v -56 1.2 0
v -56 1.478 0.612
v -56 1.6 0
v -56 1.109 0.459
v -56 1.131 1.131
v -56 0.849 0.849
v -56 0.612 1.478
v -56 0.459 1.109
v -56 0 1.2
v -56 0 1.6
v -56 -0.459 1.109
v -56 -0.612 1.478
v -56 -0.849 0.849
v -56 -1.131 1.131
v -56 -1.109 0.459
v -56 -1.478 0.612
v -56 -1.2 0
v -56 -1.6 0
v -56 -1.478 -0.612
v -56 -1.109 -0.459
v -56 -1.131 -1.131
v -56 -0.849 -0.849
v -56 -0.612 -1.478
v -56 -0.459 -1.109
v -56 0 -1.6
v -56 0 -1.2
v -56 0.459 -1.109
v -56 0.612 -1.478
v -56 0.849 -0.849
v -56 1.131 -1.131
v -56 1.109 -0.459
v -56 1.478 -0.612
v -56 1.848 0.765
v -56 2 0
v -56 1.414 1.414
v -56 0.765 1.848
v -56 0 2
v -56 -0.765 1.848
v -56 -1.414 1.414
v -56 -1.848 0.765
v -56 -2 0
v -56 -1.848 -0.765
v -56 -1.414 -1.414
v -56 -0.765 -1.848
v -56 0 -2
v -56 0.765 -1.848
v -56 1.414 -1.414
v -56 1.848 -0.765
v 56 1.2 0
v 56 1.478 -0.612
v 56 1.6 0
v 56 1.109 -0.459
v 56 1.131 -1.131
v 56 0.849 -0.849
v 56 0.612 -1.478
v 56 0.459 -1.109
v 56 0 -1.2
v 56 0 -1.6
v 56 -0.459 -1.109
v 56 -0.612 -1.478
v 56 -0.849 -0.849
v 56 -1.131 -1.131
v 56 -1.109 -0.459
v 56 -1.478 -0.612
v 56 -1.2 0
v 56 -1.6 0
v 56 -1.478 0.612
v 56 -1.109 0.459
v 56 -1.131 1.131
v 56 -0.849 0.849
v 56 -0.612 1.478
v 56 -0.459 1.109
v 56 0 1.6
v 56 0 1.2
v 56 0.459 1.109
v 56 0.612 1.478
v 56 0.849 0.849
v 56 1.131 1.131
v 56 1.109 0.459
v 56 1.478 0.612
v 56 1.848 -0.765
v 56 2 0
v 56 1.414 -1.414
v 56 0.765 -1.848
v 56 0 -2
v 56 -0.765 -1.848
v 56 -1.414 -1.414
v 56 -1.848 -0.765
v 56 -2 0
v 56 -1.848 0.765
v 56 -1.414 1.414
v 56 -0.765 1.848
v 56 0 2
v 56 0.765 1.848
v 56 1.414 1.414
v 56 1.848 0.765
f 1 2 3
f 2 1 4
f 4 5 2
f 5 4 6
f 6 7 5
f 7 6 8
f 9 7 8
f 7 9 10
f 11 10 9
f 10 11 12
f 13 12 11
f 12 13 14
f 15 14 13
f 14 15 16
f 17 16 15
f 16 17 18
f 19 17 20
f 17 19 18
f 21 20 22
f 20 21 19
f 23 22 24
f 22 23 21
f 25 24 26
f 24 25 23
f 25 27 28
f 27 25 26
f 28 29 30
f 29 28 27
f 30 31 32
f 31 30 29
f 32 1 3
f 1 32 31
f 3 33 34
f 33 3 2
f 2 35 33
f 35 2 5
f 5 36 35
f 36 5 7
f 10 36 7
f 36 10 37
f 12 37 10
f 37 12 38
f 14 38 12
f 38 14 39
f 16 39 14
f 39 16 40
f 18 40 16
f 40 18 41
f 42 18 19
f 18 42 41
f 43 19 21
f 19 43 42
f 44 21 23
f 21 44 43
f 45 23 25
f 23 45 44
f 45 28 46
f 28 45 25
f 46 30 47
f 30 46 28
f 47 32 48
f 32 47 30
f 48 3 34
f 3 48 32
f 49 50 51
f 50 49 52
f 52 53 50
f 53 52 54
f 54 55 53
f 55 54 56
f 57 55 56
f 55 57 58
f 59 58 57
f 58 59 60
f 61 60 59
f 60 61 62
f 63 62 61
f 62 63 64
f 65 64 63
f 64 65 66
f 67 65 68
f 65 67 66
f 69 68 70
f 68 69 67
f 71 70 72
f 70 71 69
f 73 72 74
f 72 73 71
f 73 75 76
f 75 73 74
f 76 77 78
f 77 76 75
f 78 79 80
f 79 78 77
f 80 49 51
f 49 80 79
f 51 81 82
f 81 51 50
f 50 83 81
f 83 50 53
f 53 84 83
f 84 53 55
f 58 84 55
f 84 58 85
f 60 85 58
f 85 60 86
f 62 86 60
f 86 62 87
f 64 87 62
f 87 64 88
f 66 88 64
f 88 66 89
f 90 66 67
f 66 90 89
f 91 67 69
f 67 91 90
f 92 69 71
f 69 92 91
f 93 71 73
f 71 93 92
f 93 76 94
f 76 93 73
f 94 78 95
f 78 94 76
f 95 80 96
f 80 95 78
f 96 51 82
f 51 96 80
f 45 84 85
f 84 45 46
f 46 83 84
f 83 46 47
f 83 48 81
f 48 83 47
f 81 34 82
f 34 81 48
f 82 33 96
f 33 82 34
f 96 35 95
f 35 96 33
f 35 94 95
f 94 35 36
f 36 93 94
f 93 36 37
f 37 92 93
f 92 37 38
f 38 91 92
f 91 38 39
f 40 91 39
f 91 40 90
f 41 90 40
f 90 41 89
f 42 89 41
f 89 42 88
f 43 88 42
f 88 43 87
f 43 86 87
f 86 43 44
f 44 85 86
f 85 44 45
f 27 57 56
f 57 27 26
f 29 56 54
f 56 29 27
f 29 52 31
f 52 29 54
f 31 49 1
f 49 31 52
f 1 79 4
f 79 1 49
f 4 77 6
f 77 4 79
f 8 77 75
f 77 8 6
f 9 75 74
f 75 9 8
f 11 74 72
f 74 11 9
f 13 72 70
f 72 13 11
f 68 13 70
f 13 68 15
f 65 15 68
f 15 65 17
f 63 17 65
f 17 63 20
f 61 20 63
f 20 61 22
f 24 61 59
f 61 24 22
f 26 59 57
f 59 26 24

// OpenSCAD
// file: ../p/4-4cyli.scad
use <../lib.scad>
function ldraw_lib__4_4cyli() = [
// 0 Cylinder 1.0
// 0 Name: 4-4cyli.dat
// 0 Author: James Jessiman
// 0 !LDRAW_ORG Primitive UPDATE 2005-01
// 0 !LICENSE Licensed under CC BY 2.0 and CC BY 4.0 : see CAreadme.txt
// 
// 0 BFC CERTIFY CCW
  [0,"BFC","CERTIFY"],
  [0,"BFC","CCW"],
// 
// 0 !HISTORY 1998-12-15 [PTadmin] Official Update 1998-10
// 0 !HISTORY 2002-03-23 [sbliss] Added BFC statement; merged headers from files in distributions LDraw 0.27 and Complete.
// 0 !HISTORY 2002-04-25 [PTadmin] Official Update 2002-02
// 0 !HISTORY 2004-12-14 [guyvivan] BFC CCW
// 0 !HISTORY 2005-12-28 [PTadmin] Official Update 2005-01
// 0 !HISTORY 2007-06-24 [PTadmin] Header formatted for Contributor Agreement
// 0 !HISTORY 2008-07-01 [PTadmin] Official Update 2008-01
// 
// 
// 4 16 1 1 0 0.9239 1 0.3827 0.9239 0 0.3827 1 0 0
  [4,16,1,1,0,0.9239,1,0.3827,0.9239,0,0.3827,1,0,0],
// 5 24 1 0 0 1 1 0 0.9239 0 0.3827 0.9239 0 -0.3827
  [5,24,1,0,0,1,1,0,0.9239,0,0.3827,0.9239,0,-0.3827],
// 4 16 0.9239 1 0.3827 0.7071 1 0.7071 0.7071 0 0.7071 0.9239 0 0.3827
  [4,16,0.9239,1,0.3827,0.7071,1,0.7071,0.7071,0,0.7071,0.9239,0,0.3827],
// 5 24 0.9239 0 0.3827 0.9239 1 0.3827 0.7071 0 0.7071 1 0 0
  [5,24,0.9239,0,0.3827,0.9239,1,0.3827,0.7071,0,0.7071,1,0,0],
// 4 16 0.7071 1 0.7071 0.3827 1 0.9239 0.3827 0 0.9239 0.7071 0 0.7071
  [4,16,0.7071,1,0.7071,0.3827,1,0.9239,0.3827,0,0.9239,0.7071,0,0.7071],
// 5 24 0.7071 0 0.7071 0.7071 1 0.7071 0.3827 0 0.9239 0.9239 0 0.3827
  [5,24,0.7071,0,0.7071,0.7071,1,0.7071,0.3827,0,0.9239,0.9239,0,0.3827],
// 4 16 0.3827 1 0.9239 0 1 1 0 0 1 0.3827 0 0.9239
  [4,16,0.3827,1,0.9239,0,1,1,0,0,1,0.3827,0,0.9239],
// 5 24 0.3827 0 0.9239 0.3827 1 0.9239 0 0 1 0.7071 0 0.7071
  [5,24,0.3827,0,0.9239,0.3827,1,0.9239,0,0,1,0.7071,0,0.7071],
// 4 16 0 1 1 -0.3827 1 0.9239 -0.3827 0 0.9239 0 0 1
  [4,16,0,1,1,-0.3827,1,0.9239,-0.3827,0,0.9239,0,0,1],
// 5 24 0 0 1 0 1 1 -0.3827 0 0.9239 0.3827 0 0.9239
  [5,24,0,0,1,0,1,1,-0.3827,0,0.9239,0.3827,0,0.9239],
// 4 16 -0.3827 1 0.9239 -0.7071 1 0.7071 -0.7071 0 0.7071 -0.3827 0 0.9239
  [4,16,-0.3827,1,0.9239,-0.7071,1,0.7071,-0.7071,0,0.7071,-0.3827,0,0.9239],
// 5 24 -0.3827 0 0.9239 -0.3827 1 0.9239 -0.7071 0 0.7071 0 0 1
  [5,24,-0.3827,0,0.9239,-0.3827,1,0.9239,-0.7071,0,0.7071,0,0,1],
// 4 16 -0.7071 1 0.7071 -0.9239 1 0.3827 -0.9239 0 0.3827 -0.7071 0 0.7071
  [4,16,-0.7071,1,0.7071,-0.9239,1,0.3827,-0.9239,0,0.3827,-0.7071,0,0.7071],
// 5 24 -0.7071 0 0.7071 -0.7071 1 0.7071 -0.9239 0 0.3827 -0.3827 0 0.9239
  [5,24,-0.7071,0,0.7071,-0.7071,1,0.7071,-0.9239,0,0.3827,-0.3827,0,0.9239],
// 4 16 -0.9239 1 0.3827 -1 1 0 -1 0 0 -0.9239 0 0.3827
  [4,16,-0.9239,1,0.3827,-1,1,0,-1,0,0,-0.9239,0,0.3827],
// 5 24 -0.9239 0 0.3827 -0.9239 1 0.3827 -1 0 0 -0.7071 0 0.7071
  [5,24,-0.9239,0,0.3827,-0.9239,1,0.3827,-1,0,0,-0.7071,0,0.7071],
// 4 16 -1 1 0 -0.9239 1 -0.3827 -0.9239 0 -0.3827 -1 0 0
  [4,16,-1,1,0,-0.9239,1,-0.3827,-0.9239,0,-0.3827,-1,0,0],
// 5 24 -1 0 0 -1 1 0 -0.9239 0 -0.3827 -0.9239 0 0.3827
  [5,24,-1,0,0,-1,1,0,-0.9239,0,-0.3827,-0.9239,0,0.3827],
// 4 16 -0.9239 1 -0.3827 -0.7071 1 -0.7071 -0.7071 0 -0.7071 -0.9239 0 -0.3827
  [4,16,-0.9239,1,-0.3827,-0.7071,1,-0.7071,-0.7071,0,-0.7071,-0.9239,0,-0.3827],
// 5 24 -0.9239 0 -0.3827 -0.9239 1 -0.3827 -0.7071 0 -0.7071 -1 0 0
  [5,24,-0.9239,0,-0.3827,-0.9239,1,-0.3827,-0.7071,0,-0.7071,-1,0,0],
// 4 16 -0.7071 1 -0.7071 -0.3827 1 -0.9239 -0.3827 0 -0.9239 -0.7071 0 -0.7071
  [4,16,-0.7071,1,-0.7071,-0.3827,1,-0.9239,-0.3827,0,-0.9239,-0.7071,0,-0.7071],
// 5 24 -0.7071 0 -0.7071 -0.7071 1 -0.7071 -0.3827 0 -0.9239 -0.9239 0 -0.3827
  [5,24,-0.7071,0,-0.7071,-0.7071,1,-0.7071,-0.3827,0,-0.9239,-0.9239,0,-0.3827],
// 4 16 -0.3827 1 -0.9239 0 1 -1 0 0 -1 -0.3827 0 -0.9239
  [4,16,-0.3827,1,-0.9239,0,1,-1,0,0,-1,-0.3827,0,-0.9239],
// 5 24 -0.3827 0 -0.9239 -0.3827 1 -0.9239 0 0 -1 -0.7071 0 -0.7071
  [5,24,-0.3827,0,-0.9239,-0.3827,1,-0.9239,0,0,-1,-0.7071,0,-0.7071],
// 4 16 0 1 -1 0.3827 1 -0.9239 0.3827 0 -0.9239 0 0 -1
  [4,16,0,1,-1,0.3827,1,-0.9239,0.3827,0,-0.9239,0,0,-1],
// 5 24 0 0 -1 0 1 -1 0.3827 0 -0.9239 -0.3827 0 -0.9239
  [5,24,0,0,-1,0,1,-1,0.3827,0,-0.9239,-0.3827,0,-0.9239],
// 4 16 0.3827 1 -0.9239 0.7071 1 -0.7071 0.7071 0 -0.7071 0.3827 0 -0.9239
  [4,16,0.3827,1,-0.9239,0.7071,1,-0.7071,0.7071,0,-0.7071,0.3827,0,-0.9239],
// 5 24 0.3827 0 -0.9239 0.3827 1 -0.9239 0.7071 0 -0.7071 0 0 -1
  [5,24,0.3827,0,-0.9239,0.3827,1,-0.9239,0.7071,0,-0.7071,0,0,-1],
// 4 16 0.7071 1 -0.7071 0.9239 1 -0.3827 0.9239 0 -0.3827 0.7071 0 -0.7071
  [4,16,0.7071,1,-0.7071,0.9239,1,-0.3827,0.9239,0,-0.3827,0.7071,0,-0.7071],
// 5 24 0.7071 0 -0.7071 0.7071 1 -0.7071 0.9239 0 -0.3827 0.3827 0 -0.9239
  [5,24,0.7071,0,-0.7071,0.7071,1,-0.7071,0.9239,0,-0.3827,0.3827,0,-0.9239],
// 4 16 0.9239 1 -0.3827 1 1 0 1 0 0 0.9239 0 -0.3827
  [4,16,0.9239,1,-0.3827,1,1,0,1,0,0,0.9239,0,-0.3827],
// 5 24 0.9239 0 -0.3827 0.9239 1 -0.3827 1 0 0 0.7071 0 -0.7071
  [5,24,0.9239,0,-0.3827,0.9239,1,-0.3827,1,0,0,0.7071,0,-0.7071],
// 0
];
module ldraw_lib__4_4cyli(step=0, col=false, unit=2/5, alt=false, line=0.2, solid=!$preview)
    makepoly(ldraw_lib__4_4cyli(), step=step, col=col, unit=unit, alt=alt, line=line, solid=solid);
ldraw_lib__4_4cyli(line=0.2);
// file: ../p/4-4ring4.scad
use <../lib.scad>
function ldraw_lib__4_4ring4() = [
// 0 Ring  4 x 1.0
// 0 Name: 4-4ring4.dat
// 0 Author: James Jessiman
// 0 !LDRAW_ORG Primitive UPDATE 2009-01
// 0 !LICENSE Licensed under CC BY 2.0 and CC BY 4.0 : see CAreadme.txt
// 
// 0 BFC CERTIFY CCW
  [0,"BFC","CERTIFY"],
  [0,"BFC","CCW"],
// 
// 0 !HISTORY 1998-12-15 [PTadmin] Official Update 1998-10
// 0 !HISTORY 2002-04-08 [BrickCaster] Modified for BFC compliance
// 0 !HISTORY 2002-04-25 [PTadmin] Official Update 2002-02
// 0 !HISTORY 2007-06-24 [PTadmin] Header formatted for Contributor Agreement
// 0 !HISTORY 2008-07-01 [PTadmin] Official Update 2008-01
// 0 !HISTORY 2008-08-26 [cwdee] Switch polygon winding and rename
// 0 !HISTORY 2009-05-02 [PTadmin] Official Update 2009-01
// 
// 
// 4 16 -1.9135 0 4.6195 -1.5308 0 3.6956 0 0 4 0 0 5
  [4,16,-1.9135,0,4.6195,-1.5308,0,3.6956,0,0,4,0,0,5],
// 4 16 -3.5355 0 3.5355 -2.8284 0 2.8284 -1.5308 0 3.6956 -1.9135 0 4.6195
  [4,16,-3.5355,0,3.5355,-2.8284,0,2.8284,-1.5308,0,3.6956,-1.9135,0,4.6195],
// 4 16 -4.6195 0 1.9135 -3.6956 0 1.5308 -2.8284 0 2.8284 -3.5355 0 3.5355
  [4,16,-4.6195,0,1.9135,-3.6956,0,1.5308,-2.8284,0,2.8284,-3.5355,0,3.5355],
// 4 16 -5 0 0 -4 0 0 -3.6956 0 1.5308 -4.6195 0 1.9135
  [4,16,-5,0,0,-4,0,0,-3.6956,0,1.5308,-4.6195,0,1.9135],
// 4 16 -4.6195 0 -1.9135 -3.6956 0 -1.5308 -4 0 0 -5 0 0
  [4,16,-4.6195,0,-1.9135,-3.6956,0,-1.5308,-4,0,0,-5,0,0],
// 4 16 -3.5355 0 -3.5355 -2.8284 0 -2.8284 -3.6956 0 -1.5308 -4.6195 0 -1.9135
  [4,16,-3.5355,0,-3.5355,-2.8284,0,-2.8284,-3.6956,0,-1.5308,-4.6195,0,-1.9135],
// 4 16 -1.9135 0 -4.6195 -1.5308 0 -3.6956 -2.8284 0 -2.8284 -3.5355 0 -3.5355
  [4,16,-1.9135,0,-4.6195,-1.5308,0,-3.6956,-2.8284,0,-2.8284,-3.5355,0,-3.5355],
// 4 16 0 0 -5 0 0 -4 -1.5308 0 -3.6956 -1.9135 0 -4.6195
  [4,16,0,0,-5,0,0,-4,-1.5308,0,-3.6956,-1.9135,0,-4.6195],
// 4 16 1.9135 0 -4.6195 1.5308 0 -3.6956 0 0 -4 0 0 -5
  [4,16,1.9135,0,-4.6195,1.5308,0,-3.6956,0,0,-4,0,0,-5],
// 4 16 3.5355 0 -3.5355 2.8284 0 -2.8284 1.5308 0 -3.6956 1.9135 0 -4.6195
  [4,16,3.5355,0,-3.5355,2.8284,0,-2.8284,1.5308,0,-3.6956,1.9135,0,-4.6195],
// 4 16 4.6195 0 -1.9135 3.6956 0 -1.5308 2.8284 0 -2.8284 3.5355 0 -3.5355
  [4,16,4.6195,0,-1.9135,3.6956,0,-1.5308,2.8284,0,-2.8284,3.5355,0,-3.5355],
// 4 16 5 0 0 4 0 0 3.6956 0 -1.5308 4.6195 0 -1.9135
  [4,16,5,0,0,4,0,0,3.6956,0,-1.5308,4.6195,0,-1.9135],
// 4 16 4.6195 0 1.9135 3.6956 0 1.5308 4 0 0 5 0 0
  [4,16,4.6195,0,1.9135,3.6956,0,1.5308,4,0,0,5,0,0],
// 4 16 3.5355 0 3.5355 2.8284 0 2.8284 3.6956 0 1.5308 4.6195 0 1.9135
  [4,16,3.5355,0,3.5355,2.8284,0,2.8284,3.6956,0,1.5308,4.6195,0,1.9135],
// 4 16 1.9135 0 4.6195 1.5308 0 3.6956 2.8284 0 2.8284 3.5355 0 3.5355
  [4,16,1.9135,0,4.6195,1.5308,0,3.6956,2.8284,0,2.8284,3.5355,0,3.5355],
// 4 16 0 0 5 0 0 4 1.5308 0 3.6956 1.9135 0 4.6195
  [4,16,0,0,5,0,0,4,1.5308,0,3.6956,1.9135,0,4.6195],
// 0
];
module ldraw_lib__4_4ring4(step=0, col=false, unit=2/5, alt=false, line=0.2, solid=!$preview)
    makepoly(ldraw_lib__4_4ring4(), step=step, col=col, unit=unit, alt=alt, line=line, solid=solid);
ldraw_lib__4_4ring4(line=0.2);
// file: ../p/4-4ring3.scad
use <../lib.scad>
function ldraw_lib__4_4ring3() = [
// 0 Ring  3 x 1.0
// 0 Name: 4-4ring3.dat
// 0 Author: James Jessiman
// 0 !LDRAW_ORG Primitive UPDATE 2009-01
// 0 !LICENSE Licensed under CC BY 2.0 and CC BY 4.0 : see CAreadme.txt
// 
// 0 BFC CERTIFY CCW
  [0,"BFC","CERTIFY"],
  [0,"BFC","CCW"],
// 
// 0 !HISTORY 1998-12-15 [PTadmin] Official Update 1998-10
// 0 !HISTORY 2002-04-05 [hafhead] Added BFC statement
// 0 !HISTORY 2002-04-25 [PTadmin] Official Update 2002-02
// 0 !HISTORY 2007-06-24 [PTadmin] Header formatted for Contributor Agreement
// 0 !HISTORY 2008-07-01 [PTadmin] Official Update 2008-01
// 0 !HISTORY 2008-08-26 [cwdee] Switch polygon winding and rename
// 0 !HISTORY 2009-05-02 [PTadmin] Official Update 2009-01
// 
// 
// 4 16 -1.5308 0 3.6956 -1.1481 0 2.7717 0 0 3 0 0 4
  [4,16,-1.5308,0,3.6956,-1.1481,0,2.7717,0,0,3,0,0,4],
// 4 16 -2.8284 0 2.8284 -2.1213 0 2.1213 -1.1481 0 2.7717 -1.5308 0 3.6956
  [4,16,-2.8284,0,2.8284,-2.1213,0,2.1213,-1.1481,0,2.7717,-1.5308,0,3.6956],
// 4 16 -3.6956 0 1.5308 -2.7717 0 1.1481 -2.1213 0 2.1213 -2.8284 0 2.8284
  [4,16,-3.6956,0,1.5308,-2.7717,0,1.1481,-2.1213,0,2.1213,-2.8284,0,2.8284],
// 4 16 -4 0 0 -3 0 0 -2.7717 0 1.1481 -3.6956 0 1.5308
  [4,16,-4,0,0,-3,0,0,-2.7717,0,1.1481,-3.6956,0,1.5308],
// 4 16 -3.6956 0 -1.5308 -2.7717 0 -1.1481 -3 0 0 -4 0 0
  [4,16,-3.6956,0,-1.5308,-2.7717,0,-1.1481,-3,0,0,-4,0,0],
// 4 16 -2.8284 0 -2.8284 -2.1213 0 -2.1213 -2.7717 0 -1.1481 -3.6956 0 -1.5308
  [4,16,-2.8284,0,-2.8284,-2.1213,0,-2.1213,-2.7717,0,-1.1481,-3.6956,0,-1.5308],
// 4 16 -1.5308 0 -3.6956 -1.1481 0 -2.7717 -2.1213 0 -2.1213 -2.8284 0 -2.8284
  [4,16,-1.5308,0,-3.6956,-1.1481,0,-2.7717,-2.1213,0,-2.1213,-2.8284,0,-2.8284],
// 4 16 0 0 -4 0 0 -3 -1.1481 0 -2.7717 -1.5308 0 -3.6956
  [4,16,0,0,-4,0,0,-3,-1.1481,0,-2.7717,-1.5308,0,-3.6956],
// 4 16 1.5308 0 -3.6956 1.1481 0 -2.7717 0 0 -3 0 0 -4
  [4,16,1.5308,0,-3.6956,1.1481,0,-2.7717,0,0,-3,0,0,-4],
// 4 16 2.8284 0 -2.8284 2.1213 0 -2.1213 1.1481 0 -2.7717 1.5308 0 -3.6956
  [4,16,2.8284,0,-2.8284,2.1213,0,-2.1213,1.1481,0,-2.7717,1.5308,0,-3.6956],
// 4 16 3.6956 0 -1.5308 2.7717 0 -1.1481 2.1213 0 -2.1213 2.8284 0 -2.8284
  [4,16,3.6956,0,-1.5308,2.7717,0,-1.1481,2.1213,0,-2.1213,2.8284,0,-2.8284],
// 4 16 4 0 0 3 0 0 2.7717 0 -1.1481 3.6956 0 -1.5308
  [4,16,4,0,0,3,0,0,2.7717,0,-1.1481,3.6956,0,-1.5308],
// 4 16 3.6956 0 1.5308 2.7717 0 1.1481 3 0 0 4 0 0
  [4,16,3.6956,0,1.5308,2.7717,0,1.1481,3,0,0,4,0,0],
// 4 16 2.8284 0 2.8284 2.1213 0 2.1213 2.7717 0 1.1481 3.6956 0 1.5308
  [4,16,2.8284,0,2.8284,2.1213,0,2.1213,2.7717,0,1.1481,3.6956,0,1.5308],
// 4 16 1.5308 0 3.6956 1.1481 0 2.7717 2.1213 0 2.1213 2.8284 0 2.8284
  [4,16,1.5308,0,3.6956,1.1481,0,2.7717,2.1213,0,2.1213,2.8284,0,2.8284],
// 4 16 0 0 4 0 0 3 1.1481 0 2.7717 1.5308 0 3.6956
  [4,16,0,0,4,0,0,3,1.1481,0,2.7717,1.5308,0,3.6956],
// 0
];
module ldraw_lib__4_4ring3(step=0, col=false, unit=2/5, alt=false, line=0.2, solid=!$preview)
    makepoly(ldraw_lib__4_4ring3(), step=step, col=col, unit=unit, alt=alt, line=line, solid=solid);
ldraw_lib__4_4ring3(line=0.2);
// file: ../p/4-4edge.scad
use <../lib.scad>
function ldraw_lib__4_4edge() = [
// 0 Circle 1.0
// 0 Name: 4-4edge.dat
// 0 Author: James Jessiman
// 0 !LDRAW_ORG Primitive UPDATE 2017-01
// 0 !LICENSE Licensed under CC BY 4.0 : see CAreadme.txt
// 
// 0 BFC CERTIFY CCW
  [0,"BFC","CERTIFY"],
  [0,"BFC","CCW"],
// 
// 0 !HISTORY 1998-12-15 [PTadmin] Official Update 1998-10
// 0 !HISTORY 2005-12-28 [PTadmin] Official Update 2005-01
// 0 !HISTORY 2007-06-24 [PTadmin] Header formatted for Contributor Agreement
// 0 !HISTORY 2008-07-01 [PTadmin] Official Update 2008-01
// 0 !HISTORY 2017-01-15 [Steffen] BFCed
// 0 !HISTORY 2017-12-30 [PTadmin] Official Update 2017-01
// 
// 
// 2 24 1 0 0 0.9239 0 0.3827
  [2,24,1,0,0,0.9239,0,0.3827],
// 2 24 0.9239 0 0.3827 0.7071 0 0.7071
  [2,24,0.9239,0,0.3827,0.7071,0,0.7071],
// 2 24 0.7071 0 0.7071 0.3827 0 0.9239
  [2,24,0.7071,0,0.7071,0.3827,0,0.9239],
// 2 24 0.3827 0 0.9239 0 0 1
  [2,24,0.3827,0,0.9239,0,0,1],
// 2 24 0 0 1 -0.3827 0 0.9239
  [2,24,0,0,1,-0.3827,0,0.9239],
// 2 24 -0.3827 0 0.9239 -0.7071 0 0.7071
  [2,24,-0.3827,0,0.9239,-0.7071,0,0.7071],
// 2 24 -0.7071 0 0.7071 -0.9239 0 0.3827
  [2,24,-0.7071,0,0.7071,-0.9239,0,0.3827],
// 2 24 -0.9239 0 0.3827 -1 0 -0
  [2,24,-0.9239,0,0.3827,-1,0,-0],
// 2 24 -1 0 -0 -0.9239 0 -0.3827
  [2,24,-1,0,-0,-0.9239,0,-0.3827],
// 2 24 -0.9239 0 -0.3827 -0.7071 0 -0.7071
  [2,24,-0.9239,0,-0.3827,-0.7071,0,-0.7071],
// 2 24 -0.7071 0 -0.7071 -0.3827 0 -0.9239
  [2,24,-0.7071,0,-0.7071,-0.3827,0,-0.9239],
// 2 24 -0.3827 0 -0.9239 0 0 -1
  [2,24,-0.3827,0,-0.9239,0,0,-1],
// 2 24 0 0 -1 0.3827 0 -0.9239
  [2,24,0,0,-1,0.3827,0,-0.9239],
// 2 24 0.3827 0 -0.9239 0.7071 0 -0.7071
  [2,24,0.3827,0,-0.9239,0.7071,0,-0.7071],
// 2 24 0.7071 0 -0.7071 0.9239 0 -0.3827
  [2,24,0.7071,0,-0.7071,0.9239,0,-0.3827],
// 2 24 0.9239 0 -0.3827 1 0 0
  [2,24,0.9239,0,-0.3827,1,0,0],
];
module ldraw_lib__4_4edge(step=0, col=false, unit=2/5, alt=false, line=0.2, solid=!$preview)
    makepoly(ldraw_lib__4_4edge(), step=step, col=col, unit=unit, alt=alt, line=line, solid=solid);
ldraw_lib__4_4edge(line=0.2);
// file: 71533k03.scad
use <../lib.scad>
use <../p/4-4cyli.scad>
function ldraw_lib__71533k03() = [
// 0 ~Technic Pneumatic Tube Segment
// 0 Name: 71533k03.dat
// 0 Author: Jaco van der Molen [Jaco]
// 0 !LDRAW_ORG Part Flexible_Section UPDATE 2020-01
// 0 !LICENSE Licensed under CC BY 4.0 : see CAreadme.txt
// 
// 0 BFC CERTIFY CW
  [0,"BFC","CERTIFY"],
  [0,"BFC","CW"],
// 
// 0 !HISTORY 2003-11-30 [Steffen] BFCed
// 0 !HISTORY 2009-12-29 [PTadmin] Official Update 2009-03
// 0 !HISTORY 2020-06-27 [PTadmin] Renamed from 166
// 0 !HISTORY 2020-06-28 [PTadmin] Official Update 2020-01
// 
// 
// 1 16 0 0 0 5 0 0 0 1 0 0 0 5 4-4cyli.dat
  [1,16,0,0,0,5,0,0,0,1,0,0,0,5, ldraw_lib__4_4cyli()],
// 0 BFC INVERTNEXT
  [0,"BFC","INVERTNEXT"],
// 1 16 0 0 0 3 0 0 0 1 0 0 0 3 4-4cyli.dat
  [1,16,0,0,0,3,0,0,0,1,0,0,0,3, ldraw_lib__4_4cyli()],
// 0
];
module ldraw_lib__71533k03(step=0, col=false, unit=2/5, alt=false, line=0.2, solid=!$preview)
    makepoly(ldraw_lib__71533k03(), step=step, col=col, unit=unit, alt=alt, line=line, solid=solid);
ldraw_lib__71533k03(line=0.2);
// file: 71533k02.scad
use <../lib.scad>
use <../p/4-4edge.scad>
use <../p/4-4ring3.scad>
use <../p/4-4ring4.scad>
function ldraw_lib__71533k02() = [
// 0 ~Technic Pneumatic Tube End (Non-Bulged)
// 0 Name: 71533k02.dat
// 0 Author: Steffen [Steffen]
// 0 !LDRAW_ORG Part Flexible_Section UPDATE 2020-01
// 0 !LICENSE Licensed under CC BY 4.0 : see CAreadme.txt
// 
// 0 BFC CERTIFY CCW
  [0,"BFC","CERTIFY"],
  [0,"BFC","CCW"],
// 
// 0 !HISTORY 2020-06-28 [PTadmin] Official Update 2020-01
// 
// 
// 0 // This file goes together with 71533k01.dat and 71533k03.dat.
// 0 // Those 3 files can be used to create Technic Pneumatic Tubes
// 0 // with either bulged or non-bulged ends.
// 
// 1 16 0 0 0 1 0 0 0 1 0 0 0 1 4-4ring3.dat
  [1,16,0,0,0,1,0,0,0,1,0,0,0,1, ldraw_lib__4_4ring3()],
// 1 16 0 0 0 1 0 0 0 1 0 0 0 1 4-4ring4.dat
  [1,16,0,0,0,1,0,0,0,1,0,0,0,1, ldraw_lib__4_4ring4()],
// 1 16 0 0 0 3 0 0 0 3 0 0 0 3 4-4edge.dat
  [1,16,0,0,0,3,0,0,0,3,0,0,0,3, ldraw_lib__4_4edge()],
// 1 16 0 0 0 5 0 0 0 5 0 0 0 5 4-4edge.dat
  [1,16,0,0,0,5,0,0,0,5,0,0,0,5, ldraw_lib__4_4edge()],
];
module ldraw_lib__71533k02(step=0, col=false, unit=2/5, alt=false, line=0.2, solid=!$preview)
    makepoly(ldraw_lib__71533k02(), step=step, col=col, unit=unit, alt=alt, line=line, solid=solid);
ldraw_lib__71533k02(line=0.2);
// main file
use <../lib.scad>
use <71533k02.scad>
use <71533k03.scad>
function ldraw_lib__37461_f1() = [
// 0 Technic Pneumatic Tube 14L
// 0 Name: 37461-f1.dat
// 0 Author: Philippe Hurbain [Philo]
// 0 !LDRAW_ORG Part UPDATE 2020-02
// 0 !LICENSE Licensed under CC BY 4.0 : see CAreadme.txt
// 
// 0 BFC CERTIFY CCW
  [0,"BFC","CERTIFY"],
  [0,"BFC","CCW"],
// 
// 0 !KEYWORDS 104 mm
// 
// 0 !HISTORY 2020-09-05 [PTadmin] Official Update 2020-02
// 
// 
// 1 16 -140 0 0 0 1 0 1 0 0 0 0 1 71533k02.dat
  [1,16,-140,0,0,0,1,0,1,0,0,0,0,1, ldraw_lib__71533k02()],
// 1 16 140 0 0 0 -1 0 -1 0 0 0 0 1 71533k02.dat
  [1,16,140,0,0,0,-1,0,-1,0,0,0,0,1, ldraw_lib__71533k02()],
// 1 16 -140 0 0 0 280 0 1 0 0 0 0 1 71533k03.dat
  [1,16,-140,0,0,0,280,0,1,0,0,0,0,1, ldraw_lib__71533k03()],
];
module ldraw_lib__37461_f1(step=0, col=false, unit=2/5, alt=false, line=0.2, solid=!$preview)
    makepoly(ldraw_lib__37461_f1(), step=step, col=col, unit=unit, alt=alt, line=line, solid=solid);
ldraw_lib__37461_f1(line=0.2);
